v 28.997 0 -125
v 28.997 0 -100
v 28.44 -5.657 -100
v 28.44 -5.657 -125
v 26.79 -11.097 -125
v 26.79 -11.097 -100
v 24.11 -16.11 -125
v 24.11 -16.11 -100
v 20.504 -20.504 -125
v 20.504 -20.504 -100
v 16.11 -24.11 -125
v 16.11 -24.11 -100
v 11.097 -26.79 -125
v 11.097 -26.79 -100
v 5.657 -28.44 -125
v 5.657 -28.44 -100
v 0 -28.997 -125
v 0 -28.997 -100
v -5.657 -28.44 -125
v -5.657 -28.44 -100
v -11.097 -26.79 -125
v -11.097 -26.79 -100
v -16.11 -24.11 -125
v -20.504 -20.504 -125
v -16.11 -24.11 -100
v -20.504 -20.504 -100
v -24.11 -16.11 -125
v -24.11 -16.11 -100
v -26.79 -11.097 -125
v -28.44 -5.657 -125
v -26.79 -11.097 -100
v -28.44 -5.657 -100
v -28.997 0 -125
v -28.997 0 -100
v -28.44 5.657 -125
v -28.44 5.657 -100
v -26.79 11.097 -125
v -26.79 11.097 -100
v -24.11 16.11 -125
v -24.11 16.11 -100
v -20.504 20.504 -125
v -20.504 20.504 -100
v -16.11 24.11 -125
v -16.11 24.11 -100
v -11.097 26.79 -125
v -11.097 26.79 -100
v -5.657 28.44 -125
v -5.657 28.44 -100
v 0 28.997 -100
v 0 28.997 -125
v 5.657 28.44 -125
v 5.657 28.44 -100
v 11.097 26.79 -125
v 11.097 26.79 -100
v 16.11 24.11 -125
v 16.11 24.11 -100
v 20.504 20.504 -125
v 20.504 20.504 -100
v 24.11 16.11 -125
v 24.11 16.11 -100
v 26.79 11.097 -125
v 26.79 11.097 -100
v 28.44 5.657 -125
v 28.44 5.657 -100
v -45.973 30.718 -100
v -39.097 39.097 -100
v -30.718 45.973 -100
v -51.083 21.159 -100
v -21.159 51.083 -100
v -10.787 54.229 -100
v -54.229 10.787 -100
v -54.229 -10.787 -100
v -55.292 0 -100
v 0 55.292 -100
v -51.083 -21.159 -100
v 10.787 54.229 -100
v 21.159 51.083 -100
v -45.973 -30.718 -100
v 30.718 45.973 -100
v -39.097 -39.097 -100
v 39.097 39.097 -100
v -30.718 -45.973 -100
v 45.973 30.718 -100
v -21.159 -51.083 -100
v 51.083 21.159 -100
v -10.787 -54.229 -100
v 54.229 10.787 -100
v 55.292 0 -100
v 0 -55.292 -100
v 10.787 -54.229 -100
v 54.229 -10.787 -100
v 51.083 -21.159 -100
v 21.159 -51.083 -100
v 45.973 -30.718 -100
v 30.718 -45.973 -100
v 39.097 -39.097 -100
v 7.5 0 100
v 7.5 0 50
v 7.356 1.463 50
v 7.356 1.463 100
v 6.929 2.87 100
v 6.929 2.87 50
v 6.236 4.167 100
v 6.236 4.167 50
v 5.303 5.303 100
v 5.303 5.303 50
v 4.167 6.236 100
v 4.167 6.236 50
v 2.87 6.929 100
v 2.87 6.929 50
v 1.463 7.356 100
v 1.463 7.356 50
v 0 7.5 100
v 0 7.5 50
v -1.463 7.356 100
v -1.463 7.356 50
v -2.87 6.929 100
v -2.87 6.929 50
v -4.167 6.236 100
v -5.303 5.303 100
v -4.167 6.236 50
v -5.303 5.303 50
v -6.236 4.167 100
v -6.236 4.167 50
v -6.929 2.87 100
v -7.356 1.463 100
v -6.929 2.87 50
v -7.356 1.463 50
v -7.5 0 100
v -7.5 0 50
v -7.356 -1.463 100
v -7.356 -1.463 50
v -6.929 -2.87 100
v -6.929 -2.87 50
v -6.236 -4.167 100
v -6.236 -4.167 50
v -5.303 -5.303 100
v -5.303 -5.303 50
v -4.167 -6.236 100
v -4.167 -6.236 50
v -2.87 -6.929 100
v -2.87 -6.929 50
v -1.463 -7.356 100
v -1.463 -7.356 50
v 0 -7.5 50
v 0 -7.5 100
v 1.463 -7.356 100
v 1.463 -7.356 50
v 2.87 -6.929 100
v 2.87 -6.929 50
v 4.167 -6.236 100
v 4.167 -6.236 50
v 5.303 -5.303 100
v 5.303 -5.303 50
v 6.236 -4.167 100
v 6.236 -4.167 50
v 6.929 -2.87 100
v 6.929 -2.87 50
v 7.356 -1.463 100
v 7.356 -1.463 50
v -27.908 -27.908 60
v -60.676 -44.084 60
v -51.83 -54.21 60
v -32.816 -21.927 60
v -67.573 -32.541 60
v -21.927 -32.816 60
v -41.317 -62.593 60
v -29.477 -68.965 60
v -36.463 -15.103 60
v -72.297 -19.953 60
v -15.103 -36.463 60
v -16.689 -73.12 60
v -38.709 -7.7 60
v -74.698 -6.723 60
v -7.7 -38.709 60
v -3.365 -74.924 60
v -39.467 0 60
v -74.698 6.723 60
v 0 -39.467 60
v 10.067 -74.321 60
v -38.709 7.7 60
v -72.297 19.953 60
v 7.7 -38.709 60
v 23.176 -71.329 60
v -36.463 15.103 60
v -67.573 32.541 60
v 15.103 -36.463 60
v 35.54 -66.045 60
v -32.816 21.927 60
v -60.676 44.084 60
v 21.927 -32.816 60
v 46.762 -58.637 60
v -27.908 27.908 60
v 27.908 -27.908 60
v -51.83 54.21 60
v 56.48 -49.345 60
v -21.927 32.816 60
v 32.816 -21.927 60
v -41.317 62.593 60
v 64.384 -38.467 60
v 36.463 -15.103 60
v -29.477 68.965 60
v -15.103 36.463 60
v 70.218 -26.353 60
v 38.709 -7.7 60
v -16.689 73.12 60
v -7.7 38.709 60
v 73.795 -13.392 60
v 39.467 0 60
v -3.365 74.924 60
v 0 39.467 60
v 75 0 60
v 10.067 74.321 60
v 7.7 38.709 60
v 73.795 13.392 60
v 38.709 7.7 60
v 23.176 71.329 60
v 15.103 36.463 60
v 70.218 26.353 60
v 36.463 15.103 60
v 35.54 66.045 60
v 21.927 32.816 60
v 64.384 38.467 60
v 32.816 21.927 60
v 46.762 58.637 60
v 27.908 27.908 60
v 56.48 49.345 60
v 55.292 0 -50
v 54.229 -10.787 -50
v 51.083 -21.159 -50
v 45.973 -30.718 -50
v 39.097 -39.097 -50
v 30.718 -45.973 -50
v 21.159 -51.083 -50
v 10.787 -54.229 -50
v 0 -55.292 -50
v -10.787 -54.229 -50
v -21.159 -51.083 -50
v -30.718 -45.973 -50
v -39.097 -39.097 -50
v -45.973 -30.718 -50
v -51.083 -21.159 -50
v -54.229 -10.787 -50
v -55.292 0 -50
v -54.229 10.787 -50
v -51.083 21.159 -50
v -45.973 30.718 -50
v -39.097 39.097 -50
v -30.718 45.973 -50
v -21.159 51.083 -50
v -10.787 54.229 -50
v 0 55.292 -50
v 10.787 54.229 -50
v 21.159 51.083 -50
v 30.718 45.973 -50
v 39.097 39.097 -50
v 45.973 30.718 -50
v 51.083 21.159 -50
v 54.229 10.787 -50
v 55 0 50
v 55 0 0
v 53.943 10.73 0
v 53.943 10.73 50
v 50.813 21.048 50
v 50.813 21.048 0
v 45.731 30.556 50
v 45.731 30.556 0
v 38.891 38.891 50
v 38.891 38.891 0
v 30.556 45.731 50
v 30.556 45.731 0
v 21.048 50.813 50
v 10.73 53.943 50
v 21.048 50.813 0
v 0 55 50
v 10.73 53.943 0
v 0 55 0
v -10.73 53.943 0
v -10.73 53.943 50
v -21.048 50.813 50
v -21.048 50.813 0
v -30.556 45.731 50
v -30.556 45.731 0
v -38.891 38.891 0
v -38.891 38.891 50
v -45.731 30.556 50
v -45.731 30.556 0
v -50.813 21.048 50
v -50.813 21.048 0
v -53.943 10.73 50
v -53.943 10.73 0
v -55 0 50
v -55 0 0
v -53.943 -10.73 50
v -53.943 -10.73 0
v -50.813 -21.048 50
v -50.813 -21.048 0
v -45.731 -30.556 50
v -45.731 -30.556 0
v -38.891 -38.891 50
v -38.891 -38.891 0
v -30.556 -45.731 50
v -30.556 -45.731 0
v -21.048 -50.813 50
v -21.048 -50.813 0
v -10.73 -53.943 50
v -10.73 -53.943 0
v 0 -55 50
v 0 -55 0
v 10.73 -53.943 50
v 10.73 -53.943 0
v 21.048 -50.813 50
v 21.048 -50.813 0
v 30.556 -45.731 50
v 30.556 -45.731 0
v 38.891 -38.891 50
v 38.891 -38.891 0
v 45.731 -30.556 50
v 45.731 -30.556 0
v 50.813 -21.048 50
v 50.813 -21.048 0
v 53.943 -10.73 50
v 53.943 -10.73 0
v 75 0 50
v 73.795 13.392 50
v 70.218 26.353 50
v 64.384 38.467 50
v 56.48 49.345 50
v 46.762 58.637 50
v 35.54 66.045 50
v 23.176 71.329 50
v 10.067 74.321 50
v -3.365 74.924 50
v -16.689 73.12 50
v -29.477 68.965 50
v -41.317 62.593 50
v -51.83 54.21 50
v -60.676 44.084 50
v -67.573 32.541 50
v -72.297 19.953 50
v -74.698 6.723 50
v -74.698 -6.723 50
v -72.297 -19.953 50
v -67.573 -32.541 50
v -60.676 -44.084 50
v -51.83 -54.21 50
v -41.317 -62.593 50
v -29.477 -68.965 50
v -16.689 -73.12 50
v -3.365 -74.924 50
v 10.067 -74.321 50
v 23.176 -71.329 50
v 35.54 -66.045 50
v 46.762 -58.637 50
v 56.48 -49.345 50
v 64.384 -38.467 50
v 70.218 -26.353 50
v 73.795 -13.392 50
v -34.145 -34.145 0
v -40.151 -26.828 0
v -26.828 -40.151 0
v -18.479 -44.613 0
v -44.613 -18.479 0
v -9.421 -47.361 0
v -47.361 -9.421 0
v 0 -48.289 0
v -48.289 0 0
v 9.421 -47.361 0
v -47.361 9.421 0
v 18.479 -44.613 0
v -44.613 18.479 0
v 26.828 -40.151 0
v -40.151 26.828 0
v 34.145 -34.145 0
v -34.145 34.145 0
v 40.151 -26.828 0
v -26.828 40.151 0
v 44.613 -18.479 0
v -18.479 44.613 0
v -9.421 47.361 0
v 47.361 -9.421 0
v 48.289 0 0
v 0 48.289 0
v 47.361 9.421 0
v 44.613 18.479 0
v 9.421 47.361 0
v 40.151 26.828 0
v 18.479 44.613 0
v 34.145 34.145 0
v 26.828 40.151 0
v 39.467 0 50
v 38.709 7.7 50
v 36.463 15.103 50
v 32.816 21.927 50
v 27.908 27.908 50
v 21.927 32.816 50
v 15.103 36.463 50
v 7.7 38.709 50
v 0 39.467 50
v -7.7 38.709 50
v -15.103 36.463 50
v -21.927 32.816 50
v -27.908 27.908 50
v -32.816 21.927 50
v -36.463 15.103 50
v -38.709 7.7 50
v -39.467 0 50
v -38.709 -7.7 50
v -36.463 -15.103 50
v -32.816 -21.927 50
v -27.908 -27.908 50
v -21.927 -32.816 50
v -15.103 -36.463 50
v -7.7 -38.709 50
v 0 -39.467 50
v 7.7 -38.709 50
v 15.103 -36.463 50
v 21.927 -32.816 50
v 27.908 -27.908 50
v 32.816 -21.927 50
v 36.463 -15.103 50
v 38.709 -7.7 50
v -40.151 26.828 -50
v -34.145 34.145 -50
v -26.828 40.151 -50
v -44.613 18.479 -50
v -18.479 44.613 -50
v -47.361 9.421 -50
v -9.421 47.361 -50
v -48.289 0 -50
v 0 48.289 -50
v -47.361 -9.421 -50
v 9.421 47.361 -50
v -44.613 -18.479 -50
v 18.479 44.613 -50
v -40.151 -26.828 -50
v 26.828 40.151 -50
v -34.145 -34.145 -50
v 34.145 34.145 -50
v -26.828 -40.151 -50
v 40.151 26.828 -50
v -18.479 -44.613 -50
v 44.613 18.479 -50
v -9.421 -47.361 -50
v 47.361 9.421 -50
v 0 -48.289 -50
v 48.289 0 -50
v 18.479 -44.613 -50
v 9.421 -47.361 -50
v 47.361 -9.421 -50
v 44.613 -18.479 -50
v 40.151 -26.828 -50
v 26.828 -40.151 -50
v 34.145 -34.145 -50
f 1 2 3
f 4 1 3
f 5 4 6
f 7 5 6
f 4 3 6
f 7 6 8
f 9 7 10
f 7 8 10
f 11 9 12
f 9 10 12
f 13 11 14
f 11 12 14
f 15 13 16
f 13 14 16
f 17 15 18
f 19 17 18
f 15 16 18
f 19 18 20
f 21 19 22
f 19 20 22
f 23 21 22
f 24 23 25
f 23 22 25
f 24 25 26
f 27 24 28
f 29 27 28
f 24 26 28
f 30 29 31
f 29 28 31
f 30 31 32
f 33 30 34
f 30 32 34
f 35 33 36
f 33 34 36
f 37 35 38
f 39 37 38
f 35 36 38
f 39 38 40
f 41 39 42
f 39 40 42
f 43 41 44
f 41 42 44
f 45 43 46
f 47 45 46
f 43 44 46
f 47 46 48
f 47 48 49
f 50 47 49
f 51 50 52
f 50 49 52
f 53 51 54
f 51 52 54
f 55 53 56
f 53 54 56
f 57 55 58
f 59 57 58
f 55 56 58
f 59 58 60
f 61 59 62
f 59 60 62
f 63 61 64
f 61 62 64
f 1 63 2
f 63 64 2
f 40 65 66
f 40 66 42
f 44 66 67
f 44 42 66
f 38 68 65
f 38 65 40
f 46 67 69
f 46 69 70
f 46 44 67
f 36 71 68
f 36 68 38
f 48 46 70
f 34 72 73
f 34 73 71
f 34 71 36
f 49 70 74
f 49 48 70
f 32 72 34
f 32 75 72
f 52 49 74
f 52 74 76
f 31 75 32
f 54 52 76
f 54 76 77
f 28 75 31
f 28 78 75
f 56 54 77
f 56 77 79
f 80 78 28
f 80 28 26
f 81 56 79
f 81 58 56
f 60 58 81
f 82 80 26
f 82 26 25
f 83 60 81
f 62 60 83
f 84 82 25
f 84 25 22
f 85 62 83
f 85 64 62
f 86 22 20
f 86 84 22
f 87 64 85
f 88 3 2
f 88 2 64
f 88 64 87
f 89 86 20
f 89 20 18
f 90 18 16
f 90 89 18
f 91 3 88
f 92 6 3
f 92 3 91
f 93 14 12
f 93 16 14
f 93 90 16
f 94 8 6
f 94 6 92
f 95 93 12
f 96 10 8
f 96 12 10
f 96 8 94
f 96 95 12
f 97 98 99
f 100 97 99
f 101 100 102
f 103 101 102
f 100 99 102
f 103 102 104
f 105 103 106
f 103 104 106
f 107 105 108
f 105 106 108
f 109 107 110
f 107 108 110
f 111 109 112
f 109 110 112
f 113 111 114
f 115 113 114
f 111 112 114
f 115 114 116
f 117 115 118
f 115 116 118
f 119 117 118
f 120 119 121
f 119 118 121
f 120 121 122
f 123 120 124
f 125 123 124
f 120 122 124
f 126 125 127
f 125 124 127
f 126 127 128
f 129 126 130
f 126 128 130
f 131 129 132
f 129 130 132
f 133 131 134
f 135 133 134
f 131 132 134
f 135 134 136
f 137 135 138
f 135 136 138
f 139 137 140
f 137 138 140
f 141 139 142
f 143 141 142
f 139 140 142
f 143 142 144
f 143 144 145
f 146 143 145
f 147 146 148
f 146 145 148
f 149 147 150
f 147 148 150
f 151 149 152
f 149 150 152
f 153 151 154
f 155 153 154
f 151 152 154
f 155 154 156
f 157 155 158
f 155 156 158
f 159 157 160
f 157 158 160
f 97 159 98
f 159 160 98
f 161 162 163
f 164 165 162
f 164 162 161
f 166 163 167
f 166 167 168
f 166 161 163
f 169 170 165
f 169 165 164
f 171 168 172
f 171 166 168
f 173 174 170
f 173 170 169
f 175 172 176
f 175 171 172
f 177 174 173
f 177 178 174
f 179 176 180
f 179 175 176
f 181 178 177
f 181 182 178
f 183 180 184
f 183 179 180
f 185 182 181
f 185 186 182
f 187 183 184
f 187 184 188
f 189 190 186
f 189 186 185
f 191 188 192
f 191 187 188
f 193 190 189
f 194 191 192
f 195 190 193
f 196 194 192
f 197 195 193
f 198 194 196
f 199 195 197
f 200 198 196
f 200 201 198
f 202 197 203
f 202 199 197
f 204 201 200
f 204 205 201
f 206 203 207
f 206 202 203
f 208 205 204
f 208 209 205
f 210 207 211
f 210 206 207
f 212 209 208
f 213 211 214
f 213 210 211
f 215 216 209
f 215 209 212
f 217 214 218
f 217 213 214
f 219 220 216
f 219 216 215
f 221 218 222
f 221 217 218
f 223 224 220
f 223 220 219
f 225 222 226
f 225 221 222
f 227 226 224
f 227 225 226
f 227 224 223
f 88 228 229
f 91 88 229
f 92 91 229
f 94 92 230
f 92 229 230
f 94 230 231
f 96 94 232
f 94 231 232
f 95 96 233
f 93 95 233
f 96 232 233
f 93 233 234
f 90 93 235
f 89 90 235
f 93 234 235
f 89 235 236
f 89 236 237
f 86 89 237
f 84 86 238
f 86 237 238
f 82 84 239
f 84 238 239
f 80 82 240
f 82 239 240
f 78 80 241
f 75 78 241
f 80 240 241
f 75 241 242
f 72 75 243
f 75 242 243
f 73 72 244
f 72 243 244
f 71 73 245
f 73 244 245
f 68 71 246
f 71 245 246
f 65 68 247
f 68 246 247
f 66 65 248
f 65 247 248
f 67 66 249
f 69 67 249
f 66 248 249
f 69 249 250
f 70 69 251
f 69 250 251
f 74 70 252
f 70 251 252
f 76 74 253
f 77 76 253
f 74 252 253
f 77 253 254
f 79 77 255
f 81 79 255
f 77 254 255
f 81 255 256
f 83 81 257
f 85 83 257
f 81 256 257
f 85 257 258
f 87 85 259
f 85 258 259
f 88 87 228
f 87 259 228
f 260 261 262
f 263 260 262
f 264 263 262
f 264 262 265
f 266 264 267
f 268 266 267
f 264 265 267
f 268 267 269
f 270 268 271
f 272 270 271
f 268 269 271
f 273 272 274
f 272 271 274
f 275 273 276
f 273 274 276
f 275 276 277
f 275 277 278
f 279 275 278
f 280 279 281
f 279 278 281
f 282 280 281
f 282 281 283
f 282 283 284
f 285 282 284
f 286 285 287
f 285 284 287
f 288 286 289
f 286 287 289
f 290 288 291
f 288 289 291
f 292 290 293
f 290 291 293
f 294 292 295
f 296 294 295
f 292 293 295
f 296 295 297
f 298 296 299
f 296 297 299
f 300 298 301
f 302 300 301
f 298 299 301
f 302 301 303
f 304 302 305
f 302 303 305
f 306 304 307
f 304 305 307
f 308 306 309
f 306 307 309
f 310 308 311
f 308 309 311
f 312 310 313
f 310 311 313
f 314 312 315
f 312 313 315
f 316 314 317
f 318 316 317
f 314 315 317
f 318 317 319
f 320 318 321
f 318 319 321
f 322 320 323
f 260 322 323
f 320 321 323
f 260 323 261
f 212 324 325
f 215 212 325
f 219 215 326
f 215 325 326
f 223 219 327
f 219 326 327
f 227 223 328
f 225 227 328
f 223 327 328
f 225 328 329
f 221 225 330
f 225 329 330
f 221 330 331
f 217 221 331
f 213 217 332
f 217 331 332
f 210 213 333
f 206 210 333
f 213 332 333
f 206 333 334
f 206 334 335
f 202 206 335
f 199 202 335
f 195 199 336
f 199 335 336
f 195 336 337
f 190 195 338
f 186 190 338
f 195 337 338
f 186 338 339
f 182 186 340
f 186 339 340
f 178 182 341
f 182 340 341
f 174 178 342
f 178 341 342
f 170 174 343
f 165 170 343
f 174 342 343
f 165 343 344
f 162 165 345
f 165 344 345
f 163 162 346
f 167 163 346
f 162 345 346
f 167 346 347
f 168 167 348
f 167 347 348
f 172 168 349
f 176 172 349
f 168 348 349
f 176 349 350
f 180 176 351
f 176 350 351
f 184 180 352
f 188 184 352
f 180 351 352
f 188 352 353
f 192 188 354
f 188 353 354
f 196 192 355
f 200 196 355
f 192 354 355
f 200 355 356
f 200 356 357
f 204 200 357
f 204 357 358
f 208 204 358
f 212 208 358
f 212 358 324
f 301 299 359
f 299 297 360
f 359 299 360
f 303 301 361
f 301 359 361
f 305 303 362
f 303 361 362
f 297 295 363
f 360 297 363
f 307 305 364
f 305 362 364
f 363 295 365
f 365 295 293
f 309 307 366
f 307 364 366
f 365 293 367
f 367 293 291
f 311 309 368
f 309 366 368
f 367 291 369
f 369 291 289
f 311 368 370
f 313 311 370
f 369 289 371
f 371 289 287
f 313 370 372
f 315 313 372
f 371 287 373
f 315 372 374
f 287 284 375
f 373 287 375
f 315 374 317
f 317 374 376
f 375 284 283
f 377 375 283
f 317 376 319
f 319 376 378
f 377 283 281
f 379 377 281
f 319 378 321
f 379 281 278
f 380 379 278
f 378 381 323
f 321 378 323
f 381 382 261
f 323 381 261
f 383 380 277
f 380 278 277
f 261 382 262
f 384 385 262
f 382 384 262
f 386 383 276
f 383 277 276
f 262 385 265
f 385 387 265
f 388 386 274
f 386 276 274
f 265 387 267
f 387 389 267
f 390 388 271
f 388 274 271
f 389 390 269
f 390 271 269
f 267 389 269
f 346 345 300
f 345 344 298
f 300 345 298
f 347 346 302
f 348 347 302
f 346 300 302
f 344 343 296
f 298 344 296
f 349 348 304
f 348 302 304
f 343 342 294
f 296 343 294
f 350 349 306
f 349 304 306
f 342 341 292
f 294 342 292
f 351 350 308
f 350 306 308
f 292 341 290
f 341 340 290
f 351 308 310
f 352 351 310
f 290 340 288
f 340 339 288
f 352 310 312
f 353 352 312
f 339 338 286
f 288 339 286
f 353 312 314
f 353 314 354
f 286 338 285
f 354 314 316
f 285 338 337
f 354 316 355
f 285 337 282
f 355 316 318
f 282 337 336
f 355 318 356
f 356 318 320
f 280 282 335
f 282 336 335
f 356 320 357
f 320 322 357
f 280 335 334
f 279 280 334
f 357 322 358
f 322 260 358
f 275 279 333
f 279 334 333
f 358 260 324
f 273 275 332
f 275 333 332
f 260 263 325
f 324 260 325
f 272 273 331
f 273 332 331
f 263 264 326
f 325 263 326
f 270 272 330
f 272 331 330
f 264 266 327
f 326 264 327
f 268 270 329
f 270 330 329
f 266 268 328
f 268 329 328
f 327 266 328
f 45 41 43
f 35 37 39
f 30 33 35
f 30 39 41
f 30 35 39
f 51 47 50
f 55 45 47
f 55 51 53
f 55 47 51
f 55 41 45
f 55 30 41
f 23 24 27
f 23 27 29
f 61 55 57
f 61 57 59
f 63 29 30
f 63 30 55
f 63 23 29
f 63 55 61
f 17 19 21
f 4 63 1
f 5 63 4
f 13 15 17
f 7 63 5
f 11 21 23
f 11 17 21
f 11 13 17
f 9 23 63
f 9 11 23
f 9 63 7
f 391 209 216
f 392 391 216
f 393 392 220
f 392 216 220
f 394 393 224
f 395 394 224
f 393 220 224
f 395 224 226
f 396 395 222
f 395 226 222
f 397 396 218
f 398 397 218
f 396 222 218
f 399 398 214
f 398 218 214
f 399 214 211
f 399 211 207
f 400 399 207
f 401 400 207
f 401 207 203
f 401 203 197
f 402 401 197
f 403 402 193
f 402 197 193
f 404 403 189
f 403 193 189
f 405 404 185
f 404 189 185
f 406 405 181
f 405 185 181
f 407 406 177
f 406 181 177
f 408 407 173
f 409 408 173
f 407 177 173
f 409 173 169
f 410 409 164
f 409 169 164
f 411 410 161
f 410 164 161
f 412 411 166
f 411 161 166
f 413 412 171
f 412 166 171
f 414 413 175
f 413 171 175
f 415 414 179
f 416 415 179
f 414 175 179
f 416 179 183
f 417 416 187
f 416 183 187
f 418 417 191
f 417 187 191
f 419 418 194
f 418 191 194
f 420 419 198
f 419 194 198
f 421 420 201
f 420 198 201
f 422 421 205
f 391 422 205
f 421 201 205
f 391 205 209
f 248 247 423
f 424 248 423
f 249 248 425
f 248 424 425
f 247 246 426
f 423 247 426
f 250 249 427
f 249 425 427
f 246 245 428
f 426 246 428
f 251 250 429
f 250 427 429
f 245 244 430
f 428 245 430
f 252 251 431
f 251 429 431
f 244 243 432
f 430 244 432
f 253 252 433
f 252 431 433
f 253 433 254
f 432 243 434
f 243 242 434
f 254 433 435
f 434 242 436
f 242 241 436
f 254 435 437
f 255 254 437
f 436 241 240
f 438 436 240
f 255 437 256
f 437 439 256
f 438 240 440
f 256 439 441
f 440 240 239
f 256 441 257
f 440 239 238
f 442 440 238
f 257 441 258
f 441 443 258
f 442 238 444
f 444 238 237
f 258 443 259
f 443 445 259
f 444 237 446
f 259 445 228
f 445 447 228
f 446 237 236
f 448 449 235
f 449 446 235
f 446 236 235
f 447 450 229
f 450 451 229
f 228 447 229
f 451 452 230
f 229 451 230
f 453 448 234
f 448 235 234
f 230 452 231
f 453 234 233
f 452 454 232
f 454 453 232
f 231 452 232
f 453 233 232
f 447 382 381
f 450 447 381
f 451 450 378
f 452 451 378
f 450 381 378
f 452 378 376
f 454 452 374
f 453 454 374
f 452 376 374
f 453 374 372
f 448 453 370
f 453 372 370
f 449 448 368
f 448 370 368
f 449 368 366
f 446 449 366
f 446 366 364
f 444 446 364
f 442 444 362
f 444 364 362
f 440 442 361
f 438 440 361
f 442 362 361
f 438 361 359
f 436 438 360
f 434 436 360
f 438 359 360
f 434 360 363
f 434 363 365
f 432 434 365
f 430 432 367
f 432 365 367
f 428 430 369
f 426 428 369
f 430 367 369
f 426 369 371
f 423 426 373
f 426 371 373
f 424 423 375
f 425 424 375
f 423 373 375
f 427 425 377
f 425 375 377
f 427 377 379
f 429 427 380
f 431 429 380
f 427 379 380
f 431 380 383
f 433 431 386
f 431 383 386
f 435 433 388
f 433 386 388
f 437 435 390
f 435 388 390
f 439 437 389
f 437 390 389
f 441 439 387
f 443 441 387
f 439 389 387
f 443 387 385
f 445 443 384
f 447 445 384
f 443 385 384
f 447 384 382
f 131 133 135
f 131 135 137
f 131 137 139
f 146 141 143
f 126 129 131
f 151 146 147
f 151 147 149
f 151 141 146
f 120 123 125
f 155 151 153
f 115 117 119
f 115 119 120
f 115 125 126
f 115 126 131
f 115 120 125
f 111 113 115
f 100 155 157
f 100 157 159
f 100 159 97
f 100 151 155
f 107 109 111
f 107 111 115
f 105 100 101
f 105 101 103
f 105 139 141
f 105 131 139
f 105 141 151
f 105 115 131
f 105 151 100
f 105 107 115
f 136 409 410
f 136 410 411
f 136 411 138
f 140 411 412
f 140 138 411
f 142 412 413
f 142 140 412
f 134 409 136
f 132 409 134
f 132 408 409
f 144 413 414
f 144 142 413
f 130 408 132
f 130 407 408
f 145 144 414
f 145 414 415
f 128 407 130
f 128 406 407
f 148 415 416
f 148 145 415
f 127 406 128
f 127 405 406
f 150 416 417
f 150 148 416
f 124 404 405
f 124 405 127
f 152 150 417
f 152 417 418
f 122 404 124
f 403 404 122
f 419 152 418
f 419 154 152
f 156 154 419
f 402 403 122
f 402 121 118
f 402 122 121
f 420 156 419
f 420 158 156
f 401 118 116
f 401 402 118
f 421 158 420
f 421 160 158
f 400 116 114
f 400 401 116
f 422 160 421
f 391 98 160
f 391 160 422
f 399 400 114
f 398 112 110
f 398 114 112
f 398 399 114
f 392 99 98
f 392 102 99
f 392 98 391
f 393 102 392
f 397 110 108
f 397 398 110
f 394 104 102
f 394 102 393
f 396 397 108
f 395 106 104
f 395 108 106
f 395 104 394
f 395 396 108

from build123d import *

# Parameters (mm, degrees)
F0_R      = 55
F1_DEPTH  = 50
F2_R      = 75
F3_DEPTH  = 10
F4_R      = 48.288599
F5_DEPTH  = 50
F6_R      = 55.291739
F7_DEPTH  = 50
F8_R      = 39.467294
F9_DEPTH  = 10
F10_R     = 7.5
F11_DEPTH = 50
F12_R     = 28.99692
F13_DEPTH = 25


with BuildPart() as f1:
    # F0 (on Top) → F1 (new body)
    with BuildSketch(Plane.XY):
        Circle(F0_R)
    extrude(amount=F1_DEPTH)

    # F2 (on face) → F3 (join)
    with BuildSketch(Plane.XY.offset(50)):
        Circle(F2_R)
    extrude(amount=F3_DEPTH)

    # F4 (on face) → F5 (join)
    with BuildSketch(Plane(origin=(0, 0, 0), x_dir=(1, 0, 0), z_dir=(0, 0, -1))):
        Circle(F4_R)
    extrude(amount=F5_DEPTH)

    # F6 (on face) → F7 (join)
    with BuildSketch(Plane(origin=(0, 0, -50), x_dir=(1, 0, 0), z_dir=(0, 0, -1))):
        Circle(F6_R)
    extrude(amount=F7_DEPTH)

    # F8 (on face) → F9 (cut)
    with BuildSketch(Plane.XY.offset(60)):
        Circle(F8_R)
    extrude(amount=-F9_DEPTH, mode=Mode.SUBTRACT)

    # F10 (on face) → F11 (join)
    with BuildSketch(Plane.XY.offset(50)):
        Circle(F10_R)
    extrude(amount=F11_DEPTH)

    # F12 (on face) → F13 (join)
    with BuildSketch(Plane(origin=(0, 0, -100), x_dir=(1, 0, 0), z_dir=(0, 0, -1))):
        Circle(F12_R)
    extrude(amount=F13_DEPTH)


solid = f1.part
